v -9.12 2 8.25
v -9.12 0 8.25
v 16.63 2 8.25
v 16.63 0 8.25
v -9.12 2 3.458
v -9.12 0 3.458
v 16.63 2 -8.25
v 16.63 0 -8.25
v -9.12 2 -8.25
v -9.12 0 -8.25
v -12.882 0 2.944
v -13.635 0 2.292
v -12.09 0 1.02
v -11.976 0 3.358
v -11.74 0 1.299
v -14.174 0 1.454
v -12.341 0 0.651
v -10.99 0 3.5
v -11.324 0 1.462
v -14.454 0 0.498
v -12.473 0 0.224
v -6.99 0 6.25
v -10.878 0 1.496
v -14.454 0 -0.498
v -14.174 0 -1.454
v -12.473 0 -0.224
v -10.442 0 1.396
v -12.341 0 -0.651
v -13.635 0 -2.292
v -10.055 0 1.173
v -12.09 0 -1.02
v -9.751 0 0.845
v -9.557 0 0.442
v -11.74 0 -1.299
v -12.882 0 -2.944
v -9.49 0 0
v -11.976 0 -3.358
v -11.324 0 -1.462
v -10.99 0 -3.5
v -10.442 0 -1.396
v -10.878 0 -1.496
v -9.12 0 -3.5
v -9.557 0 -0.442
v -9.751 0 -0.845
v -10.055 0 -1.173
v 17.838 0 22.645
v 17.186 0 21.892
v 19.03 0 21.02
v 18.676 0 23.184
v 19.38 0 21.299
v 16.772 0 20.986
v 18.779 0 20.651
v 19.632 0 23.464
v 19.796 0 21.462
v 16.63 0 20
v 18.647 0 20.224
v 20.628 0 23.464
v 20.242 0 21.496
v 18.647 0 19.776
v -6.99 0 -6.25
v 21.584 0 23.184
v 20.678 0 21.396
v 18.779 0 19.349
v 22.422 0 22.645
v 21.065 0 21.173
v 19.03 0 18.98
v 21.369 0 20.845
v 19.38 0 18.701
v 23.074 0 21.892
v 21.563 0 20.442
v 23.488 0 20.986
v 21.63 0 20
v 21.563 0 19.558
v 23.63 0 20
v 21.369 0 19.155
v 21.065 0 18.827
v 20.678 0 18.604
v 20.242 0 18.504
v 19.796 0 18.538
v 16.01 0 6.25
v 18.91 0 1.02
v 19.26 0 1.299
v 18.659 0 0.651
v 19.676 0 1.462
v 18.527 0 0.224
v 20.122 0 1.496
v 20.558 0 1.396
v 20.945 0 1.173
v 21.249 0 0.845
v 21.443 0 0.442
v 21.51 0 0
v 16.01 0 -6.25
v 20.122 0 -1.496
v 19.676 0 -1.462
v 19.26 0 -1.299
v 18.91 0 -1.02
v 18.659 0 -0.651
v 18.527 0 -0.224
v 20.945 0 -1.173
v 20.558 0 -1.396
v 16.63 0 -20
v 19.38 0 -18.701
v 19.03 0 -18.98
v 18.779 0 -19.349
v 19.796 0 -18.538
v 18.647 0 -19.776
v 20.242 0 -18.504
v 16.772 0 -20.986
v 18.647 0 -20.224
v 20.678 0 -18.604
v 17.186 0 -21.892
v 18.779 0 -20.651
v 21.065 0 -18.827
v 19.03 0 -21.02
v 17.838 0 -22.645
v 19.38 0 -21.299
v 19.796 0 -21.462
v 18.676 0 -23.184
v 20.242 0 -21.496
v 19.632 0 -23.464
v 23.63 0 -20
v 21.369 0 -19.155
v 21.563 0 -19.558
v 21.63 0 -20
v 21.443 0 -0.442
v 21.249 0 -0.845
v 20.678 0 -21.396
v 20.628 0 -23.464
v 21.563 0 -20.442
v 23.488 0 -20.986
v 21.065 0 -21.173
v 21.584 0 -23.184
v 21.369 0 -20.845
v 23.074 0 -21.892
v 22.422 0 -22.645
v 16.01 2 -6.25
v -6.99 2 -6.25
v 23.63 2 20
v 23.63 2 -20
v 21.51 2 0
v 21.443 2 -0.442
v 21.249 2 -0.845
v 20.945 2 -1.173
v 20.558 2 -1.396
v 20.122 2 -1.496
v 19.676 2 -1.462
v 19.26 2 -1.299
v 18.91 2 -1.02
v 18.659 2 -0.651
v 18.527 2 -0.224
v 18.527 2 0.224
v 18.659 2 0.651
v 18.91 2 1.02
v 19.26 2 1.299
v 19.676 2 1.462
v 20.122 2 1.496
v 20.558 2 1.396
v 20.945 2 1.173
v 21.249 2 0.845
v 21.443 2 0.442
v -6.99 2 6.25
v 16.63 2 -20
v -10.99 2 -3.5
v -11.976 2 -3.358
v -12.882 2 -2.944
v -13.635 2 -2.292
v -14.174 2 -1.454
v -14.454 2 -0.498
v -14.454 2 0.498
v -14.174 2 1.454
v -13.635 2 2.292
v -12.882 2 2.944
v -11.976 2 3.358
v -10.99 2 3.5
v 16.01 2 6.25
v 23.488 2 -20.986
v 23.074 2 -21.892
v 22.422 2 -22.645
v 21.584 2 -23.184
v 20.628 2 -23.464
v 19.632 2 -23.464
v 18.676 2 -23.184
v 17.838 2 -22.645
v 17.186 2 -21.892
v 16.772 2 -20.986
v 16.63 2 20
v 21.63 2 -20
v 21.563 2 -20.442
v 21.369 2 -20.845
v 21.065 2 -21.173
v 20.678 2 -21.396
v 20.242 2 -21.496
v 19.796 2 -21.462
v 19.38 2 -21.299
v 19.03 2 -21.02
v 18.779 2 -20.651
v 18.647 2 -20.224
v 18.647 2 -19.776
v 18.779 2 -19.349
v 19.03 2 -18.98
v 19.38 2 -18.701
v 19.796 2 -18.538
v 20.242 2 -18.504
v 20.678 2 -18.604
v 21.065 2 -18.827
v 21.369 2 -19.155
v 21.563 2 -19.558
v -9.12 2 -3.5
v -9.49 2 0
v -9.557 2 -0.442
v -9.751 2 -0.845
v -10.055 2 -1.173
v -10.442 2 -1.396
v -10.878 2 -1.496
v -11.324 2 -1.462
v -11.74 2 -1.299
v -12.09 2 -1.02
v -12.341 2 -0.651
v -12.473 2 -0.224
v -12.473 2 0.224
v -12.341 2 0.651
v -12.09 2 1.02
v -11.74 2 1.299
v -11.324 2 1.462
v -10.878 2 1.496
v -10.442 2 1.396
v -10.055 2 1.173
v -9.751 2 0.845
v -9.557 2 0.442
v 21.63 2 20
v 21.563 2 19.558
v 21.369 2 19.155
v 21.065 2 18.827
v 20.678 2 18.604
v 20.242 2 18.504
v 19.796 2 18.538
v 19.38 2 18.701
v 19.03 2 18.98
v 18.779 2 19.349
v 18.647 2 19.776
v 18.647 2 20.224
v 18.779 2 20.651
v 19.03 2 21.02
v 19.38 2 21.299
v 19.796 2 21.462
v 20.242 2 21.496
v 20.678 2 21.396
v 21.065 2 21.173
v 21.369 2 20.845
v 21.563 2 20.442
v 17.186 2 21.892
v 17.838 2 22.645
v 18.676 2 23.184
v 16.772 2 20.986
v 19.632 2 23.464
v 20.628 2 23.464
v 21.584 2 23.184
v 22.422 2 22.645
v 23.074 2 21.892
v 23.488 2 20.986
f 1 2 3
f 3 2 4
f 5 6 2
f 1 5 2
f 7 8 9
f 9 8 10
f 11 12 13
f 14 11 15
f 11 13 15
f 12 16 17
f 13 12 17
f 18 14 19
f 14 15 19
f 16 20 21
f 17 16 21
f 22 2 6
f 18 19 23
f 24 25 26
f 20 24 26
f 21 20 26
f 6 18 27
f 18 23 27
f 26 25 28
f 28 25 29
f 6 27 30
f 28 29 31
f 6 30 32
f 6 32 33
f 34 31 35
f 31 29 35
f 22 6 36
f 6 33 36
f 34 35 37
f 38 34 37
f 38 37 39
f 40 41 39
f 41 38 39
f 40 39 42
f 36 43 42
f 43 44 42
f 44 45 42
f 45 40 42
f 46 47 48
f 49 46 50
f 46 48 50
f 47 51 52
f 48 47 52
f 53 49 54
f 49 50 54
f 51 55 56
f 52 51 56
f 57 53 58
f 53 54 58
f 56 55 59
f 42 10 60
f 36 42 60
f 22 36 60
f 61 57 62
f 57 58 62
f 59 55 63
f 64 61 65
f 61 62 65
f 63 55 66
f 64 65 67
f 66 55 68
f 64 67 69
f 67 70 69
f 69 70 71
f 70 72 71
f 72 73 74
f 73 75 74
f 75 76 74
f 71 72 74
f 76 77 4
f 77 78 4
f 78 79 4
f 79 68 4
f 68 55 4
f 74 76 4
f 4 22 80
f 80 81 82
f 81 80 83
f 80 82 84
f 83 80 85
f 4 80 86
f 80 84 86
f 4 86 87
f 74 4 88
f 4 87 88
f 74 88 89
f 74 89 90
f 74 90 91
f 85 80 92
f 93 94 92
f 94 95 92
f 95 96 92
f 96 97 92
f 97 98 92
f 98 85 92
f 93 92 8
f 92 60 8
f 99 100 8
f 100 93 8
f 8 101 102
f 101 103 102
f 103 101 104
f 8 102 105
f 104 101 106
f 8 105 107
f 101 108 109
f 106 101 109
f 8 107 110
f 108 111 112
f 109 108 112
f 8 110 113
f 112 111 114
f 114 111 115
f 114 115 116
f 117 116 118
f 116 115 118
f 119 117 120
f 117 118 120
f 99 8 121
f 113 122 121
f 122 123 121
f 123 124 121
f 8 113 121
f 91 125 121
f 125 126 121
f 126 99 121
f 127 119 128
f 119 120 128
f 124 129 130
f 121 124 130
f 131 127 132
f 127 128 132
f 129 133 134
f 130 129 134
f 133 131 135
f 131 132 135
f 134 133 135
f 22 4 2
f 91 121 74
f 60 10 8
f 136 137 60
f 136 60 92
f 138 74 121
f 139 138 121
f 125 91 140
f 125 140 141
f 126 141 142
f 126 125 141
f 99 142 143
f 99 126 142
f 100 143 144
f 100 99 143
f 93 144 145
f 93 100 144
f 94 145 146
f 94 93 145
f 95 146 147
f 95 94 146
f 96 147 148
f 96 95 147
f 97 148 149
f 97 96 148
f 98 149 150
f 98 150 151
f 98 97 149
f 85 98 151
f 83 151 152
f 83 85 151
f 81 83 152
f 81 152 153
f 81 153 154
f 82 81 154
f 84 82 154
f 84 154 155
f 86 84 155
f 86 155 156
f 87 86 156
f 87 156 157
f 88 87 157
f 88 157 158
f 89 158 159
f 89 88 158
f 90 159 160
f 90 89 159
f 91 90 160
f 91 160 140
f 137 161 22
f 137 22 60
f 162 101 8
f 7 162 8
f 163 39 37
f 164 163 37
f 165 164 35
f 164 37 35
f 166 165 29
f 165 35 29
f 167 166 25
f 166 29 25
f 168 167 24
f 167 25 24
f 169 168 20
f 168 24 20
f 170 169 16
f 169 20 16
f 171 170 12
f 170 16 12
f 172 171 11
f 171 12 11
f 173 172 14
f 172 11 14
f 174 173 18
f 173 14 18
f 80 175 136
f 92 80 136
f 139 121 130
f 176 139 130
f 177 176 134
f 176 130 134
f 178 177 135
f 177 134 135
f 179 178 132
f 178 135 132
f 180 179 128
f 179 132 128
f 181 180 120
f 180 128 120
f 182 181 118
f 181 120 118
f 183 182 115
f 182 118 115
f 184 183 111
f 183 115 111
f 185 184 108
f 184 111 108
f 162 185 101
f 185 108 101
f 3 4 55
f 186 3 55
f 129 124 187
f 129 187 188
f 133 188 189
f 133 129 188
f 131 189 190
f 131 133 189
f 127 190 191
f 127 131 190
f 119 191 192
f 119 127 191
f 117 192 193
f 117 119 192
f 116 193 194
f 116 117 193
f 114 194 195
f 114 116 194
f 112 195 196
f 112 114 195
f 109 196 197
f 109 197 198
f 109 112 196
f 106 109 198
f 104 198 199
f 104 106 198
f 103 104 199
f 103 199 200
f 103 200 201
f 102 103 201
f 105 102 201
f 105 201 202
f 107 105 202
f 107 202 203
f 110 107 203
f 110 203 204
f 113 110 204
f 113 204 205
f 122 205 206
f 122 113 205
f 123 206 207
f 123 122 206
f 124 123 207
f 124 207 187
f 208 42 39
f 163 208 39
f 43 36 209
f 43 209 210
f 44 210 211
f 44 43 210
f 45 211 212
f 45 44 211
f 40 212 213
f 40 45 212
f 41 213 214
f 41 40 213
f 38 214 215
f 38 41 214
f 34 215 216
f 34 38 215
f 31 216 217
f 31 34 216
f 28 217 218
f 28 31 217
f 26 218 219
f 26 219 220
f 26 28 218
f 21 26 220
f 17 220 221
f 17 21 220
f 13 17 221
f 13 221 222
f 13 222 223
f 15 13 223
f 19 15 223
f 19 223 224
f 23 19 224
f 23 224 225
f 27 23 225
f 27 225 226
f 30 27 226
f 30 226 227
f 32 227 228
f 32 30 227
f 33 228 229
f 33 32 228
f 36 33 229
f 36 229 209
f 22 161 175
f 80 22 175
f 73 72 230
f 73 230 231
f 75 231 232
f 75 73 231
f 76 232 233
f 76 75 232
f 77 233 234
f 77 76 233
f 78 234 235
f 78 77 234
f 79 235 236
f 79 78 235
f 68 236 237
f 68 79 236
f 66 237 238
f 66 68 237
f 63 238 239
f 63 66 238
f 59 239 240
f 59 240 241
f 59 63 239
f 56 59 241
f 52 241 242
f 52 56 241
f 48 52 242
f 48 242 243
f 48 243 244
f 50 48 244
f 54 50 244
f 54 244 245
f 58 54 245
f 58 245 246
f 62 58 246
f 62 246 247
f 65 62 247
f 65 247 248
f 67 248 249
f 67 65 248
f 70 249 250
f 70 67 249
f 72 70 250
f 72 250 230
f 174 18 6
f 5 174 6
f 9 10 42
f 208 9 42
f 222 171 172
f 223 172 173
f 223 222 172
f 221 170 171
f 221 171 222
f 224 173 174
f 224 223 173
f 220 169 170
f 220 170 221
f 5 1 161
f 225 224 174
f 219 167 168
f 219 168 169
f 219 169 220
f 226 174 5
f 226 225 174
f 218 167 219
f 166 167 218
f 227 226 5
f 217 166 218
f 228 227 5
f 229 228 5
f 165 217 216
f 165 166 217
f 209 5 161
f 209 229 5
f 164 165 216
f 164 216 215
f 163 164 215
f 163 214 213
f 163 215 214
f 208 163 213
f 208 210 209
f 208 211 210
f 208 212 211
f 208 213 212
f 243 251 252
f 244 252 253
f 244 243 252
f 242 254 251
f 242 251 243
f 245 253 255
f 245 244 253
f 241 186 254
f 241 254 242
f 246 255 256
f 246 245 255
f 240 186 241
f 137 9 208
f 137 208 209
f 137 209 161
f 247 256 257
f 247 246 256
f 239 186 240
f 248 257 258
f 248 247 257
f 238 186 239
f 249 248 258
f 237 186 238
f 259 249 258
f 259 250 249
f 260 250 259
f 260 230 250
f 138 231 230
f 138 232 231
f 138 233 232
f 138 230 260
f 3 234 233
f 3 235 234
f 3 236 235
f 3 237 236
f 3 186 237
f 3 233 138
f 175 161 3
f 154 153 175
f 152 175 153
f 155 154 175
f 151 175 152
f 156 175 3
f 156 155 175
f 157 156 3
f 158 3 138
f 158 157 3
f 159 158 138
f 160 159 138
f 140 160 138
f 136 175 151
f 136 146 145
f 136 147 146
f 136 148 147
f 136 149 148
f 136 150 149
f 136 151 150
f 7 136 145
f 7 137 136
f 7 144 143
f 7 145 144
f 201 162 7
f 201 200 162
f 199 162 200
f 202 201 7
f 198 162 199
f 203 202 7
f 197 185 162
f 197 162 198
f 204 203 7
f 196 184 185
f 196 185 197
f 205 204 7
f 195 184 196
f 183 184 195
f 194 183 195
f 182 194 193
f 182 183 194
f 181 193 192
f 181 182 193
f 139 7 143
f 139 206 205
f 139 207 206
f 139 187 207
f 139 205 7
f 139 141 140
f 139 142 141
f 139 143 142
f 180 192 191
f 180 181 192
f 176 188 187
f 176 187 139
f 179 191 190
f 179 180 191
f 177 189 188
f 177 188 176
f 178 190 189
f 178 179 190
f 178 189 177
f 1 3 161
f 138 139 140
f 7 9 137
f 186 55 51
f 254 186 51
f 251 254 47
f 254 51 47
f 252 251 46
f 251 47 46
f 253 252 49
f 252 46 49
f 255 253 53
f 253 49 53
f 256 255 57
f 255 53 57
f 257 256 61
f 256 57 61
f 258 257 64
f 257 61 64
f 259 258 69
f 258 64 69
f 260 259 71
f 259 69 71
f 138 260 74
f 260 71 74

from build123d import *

# Parameters (mm, degrees)
SKETCH1_R           = 1.5
BOSS_EXTRUDE1_DEPTH = 2
SKETCH2_W           = 23
SKETCH2_H           = 12.5
CUT_EXTRUDE1_DEPTH  = 3


with BuildPart() as part:
    # Sketch1 → Boss-Extrude1 (new body)
    with BuildSketch(Plane(origin=(0, 0, 0), x_dir=(1, 0, 0), z_dir=(0, 1, 0))):
        with BuildLine():
            Line((-9.12, -3.457764929), (-9.12, -8.25))
            Line((-9.12, -8.25), (16.63, -8.25))
            Line((16.63, -8.25), (16.63, -20))
            ThreePointArc((16.63, -20), (20.13, -23.5), (23.63, -20))
            Line((23.63, -20), (23.63, 20))
            ThreePointArc((23.63, 20), (20.13, 23.5), (16.63, 20))
            Line((16.63, 20), (16.63, 8.25))
            Line((16.63, 8.25), (-9.12, 8.25))
            Line((-9.12, 8.25), (-9.12, 3.5))
            Line((-9.12, 3.5), (-10.99, 3.5))
            ThreePointArc((-10.99, 3.5), (-14.49, 0), (-10.99, -3.5))
            Line((-10.99, -3.5), (-9.12, -3.457764929))
        make_face()
        with Locations((-10.99, 0)):
            Circle(SKETCH1_R, mode=Mode.SUBTRACT)
        with Locations((20.01, 0)):
            Circle(SKETCH1_R, mode=Mode.SUBTRACT)
        with Locations((20.13, 20)):
            Circle(SKETCH1_R, mode=Mode.SUBTRACT)
        with Locations((20.13, -20)):
            Circle(SKETCH1_R, mode=Mode.SUBTRACT)
    extrude(amount=BOSS_EXTRUDE1_DEPTH)

    # Sketch2 → Cut-Extrude1 (cut, through all)
    with BuildSketch(Plane(origin=(0, 2, 0), x_dir=(1, 0, 0), z_dir=(0, 1, 0))):
        with Locations((4.51, 0)):
            Rectangle(SKETCH2_W, SKETCH2_H)
    extrude(amount=-CUT_EXTRUDE1_DEPTH, mode=Mode.SUBTRACT)


solid = part.part
